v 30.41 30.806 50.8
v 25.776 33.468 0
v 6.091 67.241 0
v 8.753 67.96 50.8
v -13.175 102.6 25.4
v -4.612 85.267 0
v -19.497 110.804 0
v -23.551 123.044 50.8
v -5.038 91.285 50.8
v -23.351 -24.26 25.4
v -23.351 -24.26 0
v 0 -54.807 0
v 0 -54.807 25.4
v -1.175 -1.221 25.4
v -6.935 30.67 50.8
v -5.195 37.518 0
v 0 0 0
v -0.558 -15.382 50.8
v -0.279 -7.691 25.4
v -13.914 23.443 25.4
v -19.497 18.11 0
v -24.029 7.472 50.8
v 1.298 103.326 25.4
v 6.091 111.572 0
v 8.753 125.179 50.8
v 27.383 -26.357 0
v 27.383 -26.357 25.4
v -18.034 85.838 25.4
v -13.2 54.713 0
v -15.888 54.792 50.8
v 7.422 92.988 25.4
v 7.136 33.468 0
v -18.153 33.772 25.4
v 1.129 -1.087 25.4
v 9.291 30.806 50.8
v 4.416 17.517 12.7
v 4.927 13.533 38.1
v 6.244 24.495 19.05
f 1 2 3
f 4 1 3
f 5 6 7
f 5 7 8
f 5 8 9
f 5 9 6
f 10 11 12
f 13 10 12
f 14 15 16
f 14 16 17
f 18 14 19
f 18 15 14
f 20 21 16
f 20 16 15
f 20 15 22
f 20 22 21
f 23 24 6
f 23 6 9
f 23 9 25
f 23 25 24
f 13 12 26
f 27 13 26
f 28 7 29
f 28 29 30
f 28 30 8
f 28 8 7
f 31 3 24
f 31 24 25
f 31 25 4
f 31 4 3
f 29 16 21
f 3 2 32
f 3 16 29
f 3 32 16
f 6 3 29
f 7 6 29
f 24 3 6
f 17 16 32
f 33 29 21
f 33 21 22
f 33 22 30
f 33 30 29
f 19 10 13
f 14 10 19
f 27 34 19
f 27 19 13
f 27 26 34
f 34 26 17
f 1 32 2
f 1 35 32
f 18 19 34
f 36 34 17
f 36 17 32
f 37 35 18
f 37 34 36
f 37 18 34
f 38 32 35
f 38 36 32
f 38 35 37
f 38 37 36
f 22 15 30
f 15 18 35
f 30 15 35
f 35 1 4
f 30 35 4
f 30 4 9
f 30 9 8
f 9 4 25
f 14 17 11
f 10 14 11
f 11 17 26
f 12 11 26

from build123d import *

# Parameters (mm, degrees)
F1_DEPTH = 50.8
F1_TAPER = -3
F3_DEPTH = 25.4


with BuildPart() as f1:
    # F0 (on Top) → F1 (new body)
    with BuildSketch(Plane.XY):
        Polygon((-5.1951231435, 37.5182926655), (0, 0), (7.1364506148, 33.4682352841), (25.7764216512, 33.4682352841), (6.0908943415, 67.2407448292), (6.0908943415, 111.572496593), (-4.6124211513, 85.2674916387), (-19.497255753, 110.8039281665), (-13.200096786, 54.7134391963), (-19.497255753, 18.1095562875), align=None)
    extrude(amount=F1_DEPTH, taper=F1_TAPER)

    # F2 (on Top) → F3 (join)
    with BuildSketch(Plane.XY):
        Polygon((27.3833926767, -26.3573322445), (0, 0), (-23.3508690358, -24.2598913356), (0, -54.8067286982), align=None)
    extrude(amount=F3_DEPTH)


solid = f1.part
